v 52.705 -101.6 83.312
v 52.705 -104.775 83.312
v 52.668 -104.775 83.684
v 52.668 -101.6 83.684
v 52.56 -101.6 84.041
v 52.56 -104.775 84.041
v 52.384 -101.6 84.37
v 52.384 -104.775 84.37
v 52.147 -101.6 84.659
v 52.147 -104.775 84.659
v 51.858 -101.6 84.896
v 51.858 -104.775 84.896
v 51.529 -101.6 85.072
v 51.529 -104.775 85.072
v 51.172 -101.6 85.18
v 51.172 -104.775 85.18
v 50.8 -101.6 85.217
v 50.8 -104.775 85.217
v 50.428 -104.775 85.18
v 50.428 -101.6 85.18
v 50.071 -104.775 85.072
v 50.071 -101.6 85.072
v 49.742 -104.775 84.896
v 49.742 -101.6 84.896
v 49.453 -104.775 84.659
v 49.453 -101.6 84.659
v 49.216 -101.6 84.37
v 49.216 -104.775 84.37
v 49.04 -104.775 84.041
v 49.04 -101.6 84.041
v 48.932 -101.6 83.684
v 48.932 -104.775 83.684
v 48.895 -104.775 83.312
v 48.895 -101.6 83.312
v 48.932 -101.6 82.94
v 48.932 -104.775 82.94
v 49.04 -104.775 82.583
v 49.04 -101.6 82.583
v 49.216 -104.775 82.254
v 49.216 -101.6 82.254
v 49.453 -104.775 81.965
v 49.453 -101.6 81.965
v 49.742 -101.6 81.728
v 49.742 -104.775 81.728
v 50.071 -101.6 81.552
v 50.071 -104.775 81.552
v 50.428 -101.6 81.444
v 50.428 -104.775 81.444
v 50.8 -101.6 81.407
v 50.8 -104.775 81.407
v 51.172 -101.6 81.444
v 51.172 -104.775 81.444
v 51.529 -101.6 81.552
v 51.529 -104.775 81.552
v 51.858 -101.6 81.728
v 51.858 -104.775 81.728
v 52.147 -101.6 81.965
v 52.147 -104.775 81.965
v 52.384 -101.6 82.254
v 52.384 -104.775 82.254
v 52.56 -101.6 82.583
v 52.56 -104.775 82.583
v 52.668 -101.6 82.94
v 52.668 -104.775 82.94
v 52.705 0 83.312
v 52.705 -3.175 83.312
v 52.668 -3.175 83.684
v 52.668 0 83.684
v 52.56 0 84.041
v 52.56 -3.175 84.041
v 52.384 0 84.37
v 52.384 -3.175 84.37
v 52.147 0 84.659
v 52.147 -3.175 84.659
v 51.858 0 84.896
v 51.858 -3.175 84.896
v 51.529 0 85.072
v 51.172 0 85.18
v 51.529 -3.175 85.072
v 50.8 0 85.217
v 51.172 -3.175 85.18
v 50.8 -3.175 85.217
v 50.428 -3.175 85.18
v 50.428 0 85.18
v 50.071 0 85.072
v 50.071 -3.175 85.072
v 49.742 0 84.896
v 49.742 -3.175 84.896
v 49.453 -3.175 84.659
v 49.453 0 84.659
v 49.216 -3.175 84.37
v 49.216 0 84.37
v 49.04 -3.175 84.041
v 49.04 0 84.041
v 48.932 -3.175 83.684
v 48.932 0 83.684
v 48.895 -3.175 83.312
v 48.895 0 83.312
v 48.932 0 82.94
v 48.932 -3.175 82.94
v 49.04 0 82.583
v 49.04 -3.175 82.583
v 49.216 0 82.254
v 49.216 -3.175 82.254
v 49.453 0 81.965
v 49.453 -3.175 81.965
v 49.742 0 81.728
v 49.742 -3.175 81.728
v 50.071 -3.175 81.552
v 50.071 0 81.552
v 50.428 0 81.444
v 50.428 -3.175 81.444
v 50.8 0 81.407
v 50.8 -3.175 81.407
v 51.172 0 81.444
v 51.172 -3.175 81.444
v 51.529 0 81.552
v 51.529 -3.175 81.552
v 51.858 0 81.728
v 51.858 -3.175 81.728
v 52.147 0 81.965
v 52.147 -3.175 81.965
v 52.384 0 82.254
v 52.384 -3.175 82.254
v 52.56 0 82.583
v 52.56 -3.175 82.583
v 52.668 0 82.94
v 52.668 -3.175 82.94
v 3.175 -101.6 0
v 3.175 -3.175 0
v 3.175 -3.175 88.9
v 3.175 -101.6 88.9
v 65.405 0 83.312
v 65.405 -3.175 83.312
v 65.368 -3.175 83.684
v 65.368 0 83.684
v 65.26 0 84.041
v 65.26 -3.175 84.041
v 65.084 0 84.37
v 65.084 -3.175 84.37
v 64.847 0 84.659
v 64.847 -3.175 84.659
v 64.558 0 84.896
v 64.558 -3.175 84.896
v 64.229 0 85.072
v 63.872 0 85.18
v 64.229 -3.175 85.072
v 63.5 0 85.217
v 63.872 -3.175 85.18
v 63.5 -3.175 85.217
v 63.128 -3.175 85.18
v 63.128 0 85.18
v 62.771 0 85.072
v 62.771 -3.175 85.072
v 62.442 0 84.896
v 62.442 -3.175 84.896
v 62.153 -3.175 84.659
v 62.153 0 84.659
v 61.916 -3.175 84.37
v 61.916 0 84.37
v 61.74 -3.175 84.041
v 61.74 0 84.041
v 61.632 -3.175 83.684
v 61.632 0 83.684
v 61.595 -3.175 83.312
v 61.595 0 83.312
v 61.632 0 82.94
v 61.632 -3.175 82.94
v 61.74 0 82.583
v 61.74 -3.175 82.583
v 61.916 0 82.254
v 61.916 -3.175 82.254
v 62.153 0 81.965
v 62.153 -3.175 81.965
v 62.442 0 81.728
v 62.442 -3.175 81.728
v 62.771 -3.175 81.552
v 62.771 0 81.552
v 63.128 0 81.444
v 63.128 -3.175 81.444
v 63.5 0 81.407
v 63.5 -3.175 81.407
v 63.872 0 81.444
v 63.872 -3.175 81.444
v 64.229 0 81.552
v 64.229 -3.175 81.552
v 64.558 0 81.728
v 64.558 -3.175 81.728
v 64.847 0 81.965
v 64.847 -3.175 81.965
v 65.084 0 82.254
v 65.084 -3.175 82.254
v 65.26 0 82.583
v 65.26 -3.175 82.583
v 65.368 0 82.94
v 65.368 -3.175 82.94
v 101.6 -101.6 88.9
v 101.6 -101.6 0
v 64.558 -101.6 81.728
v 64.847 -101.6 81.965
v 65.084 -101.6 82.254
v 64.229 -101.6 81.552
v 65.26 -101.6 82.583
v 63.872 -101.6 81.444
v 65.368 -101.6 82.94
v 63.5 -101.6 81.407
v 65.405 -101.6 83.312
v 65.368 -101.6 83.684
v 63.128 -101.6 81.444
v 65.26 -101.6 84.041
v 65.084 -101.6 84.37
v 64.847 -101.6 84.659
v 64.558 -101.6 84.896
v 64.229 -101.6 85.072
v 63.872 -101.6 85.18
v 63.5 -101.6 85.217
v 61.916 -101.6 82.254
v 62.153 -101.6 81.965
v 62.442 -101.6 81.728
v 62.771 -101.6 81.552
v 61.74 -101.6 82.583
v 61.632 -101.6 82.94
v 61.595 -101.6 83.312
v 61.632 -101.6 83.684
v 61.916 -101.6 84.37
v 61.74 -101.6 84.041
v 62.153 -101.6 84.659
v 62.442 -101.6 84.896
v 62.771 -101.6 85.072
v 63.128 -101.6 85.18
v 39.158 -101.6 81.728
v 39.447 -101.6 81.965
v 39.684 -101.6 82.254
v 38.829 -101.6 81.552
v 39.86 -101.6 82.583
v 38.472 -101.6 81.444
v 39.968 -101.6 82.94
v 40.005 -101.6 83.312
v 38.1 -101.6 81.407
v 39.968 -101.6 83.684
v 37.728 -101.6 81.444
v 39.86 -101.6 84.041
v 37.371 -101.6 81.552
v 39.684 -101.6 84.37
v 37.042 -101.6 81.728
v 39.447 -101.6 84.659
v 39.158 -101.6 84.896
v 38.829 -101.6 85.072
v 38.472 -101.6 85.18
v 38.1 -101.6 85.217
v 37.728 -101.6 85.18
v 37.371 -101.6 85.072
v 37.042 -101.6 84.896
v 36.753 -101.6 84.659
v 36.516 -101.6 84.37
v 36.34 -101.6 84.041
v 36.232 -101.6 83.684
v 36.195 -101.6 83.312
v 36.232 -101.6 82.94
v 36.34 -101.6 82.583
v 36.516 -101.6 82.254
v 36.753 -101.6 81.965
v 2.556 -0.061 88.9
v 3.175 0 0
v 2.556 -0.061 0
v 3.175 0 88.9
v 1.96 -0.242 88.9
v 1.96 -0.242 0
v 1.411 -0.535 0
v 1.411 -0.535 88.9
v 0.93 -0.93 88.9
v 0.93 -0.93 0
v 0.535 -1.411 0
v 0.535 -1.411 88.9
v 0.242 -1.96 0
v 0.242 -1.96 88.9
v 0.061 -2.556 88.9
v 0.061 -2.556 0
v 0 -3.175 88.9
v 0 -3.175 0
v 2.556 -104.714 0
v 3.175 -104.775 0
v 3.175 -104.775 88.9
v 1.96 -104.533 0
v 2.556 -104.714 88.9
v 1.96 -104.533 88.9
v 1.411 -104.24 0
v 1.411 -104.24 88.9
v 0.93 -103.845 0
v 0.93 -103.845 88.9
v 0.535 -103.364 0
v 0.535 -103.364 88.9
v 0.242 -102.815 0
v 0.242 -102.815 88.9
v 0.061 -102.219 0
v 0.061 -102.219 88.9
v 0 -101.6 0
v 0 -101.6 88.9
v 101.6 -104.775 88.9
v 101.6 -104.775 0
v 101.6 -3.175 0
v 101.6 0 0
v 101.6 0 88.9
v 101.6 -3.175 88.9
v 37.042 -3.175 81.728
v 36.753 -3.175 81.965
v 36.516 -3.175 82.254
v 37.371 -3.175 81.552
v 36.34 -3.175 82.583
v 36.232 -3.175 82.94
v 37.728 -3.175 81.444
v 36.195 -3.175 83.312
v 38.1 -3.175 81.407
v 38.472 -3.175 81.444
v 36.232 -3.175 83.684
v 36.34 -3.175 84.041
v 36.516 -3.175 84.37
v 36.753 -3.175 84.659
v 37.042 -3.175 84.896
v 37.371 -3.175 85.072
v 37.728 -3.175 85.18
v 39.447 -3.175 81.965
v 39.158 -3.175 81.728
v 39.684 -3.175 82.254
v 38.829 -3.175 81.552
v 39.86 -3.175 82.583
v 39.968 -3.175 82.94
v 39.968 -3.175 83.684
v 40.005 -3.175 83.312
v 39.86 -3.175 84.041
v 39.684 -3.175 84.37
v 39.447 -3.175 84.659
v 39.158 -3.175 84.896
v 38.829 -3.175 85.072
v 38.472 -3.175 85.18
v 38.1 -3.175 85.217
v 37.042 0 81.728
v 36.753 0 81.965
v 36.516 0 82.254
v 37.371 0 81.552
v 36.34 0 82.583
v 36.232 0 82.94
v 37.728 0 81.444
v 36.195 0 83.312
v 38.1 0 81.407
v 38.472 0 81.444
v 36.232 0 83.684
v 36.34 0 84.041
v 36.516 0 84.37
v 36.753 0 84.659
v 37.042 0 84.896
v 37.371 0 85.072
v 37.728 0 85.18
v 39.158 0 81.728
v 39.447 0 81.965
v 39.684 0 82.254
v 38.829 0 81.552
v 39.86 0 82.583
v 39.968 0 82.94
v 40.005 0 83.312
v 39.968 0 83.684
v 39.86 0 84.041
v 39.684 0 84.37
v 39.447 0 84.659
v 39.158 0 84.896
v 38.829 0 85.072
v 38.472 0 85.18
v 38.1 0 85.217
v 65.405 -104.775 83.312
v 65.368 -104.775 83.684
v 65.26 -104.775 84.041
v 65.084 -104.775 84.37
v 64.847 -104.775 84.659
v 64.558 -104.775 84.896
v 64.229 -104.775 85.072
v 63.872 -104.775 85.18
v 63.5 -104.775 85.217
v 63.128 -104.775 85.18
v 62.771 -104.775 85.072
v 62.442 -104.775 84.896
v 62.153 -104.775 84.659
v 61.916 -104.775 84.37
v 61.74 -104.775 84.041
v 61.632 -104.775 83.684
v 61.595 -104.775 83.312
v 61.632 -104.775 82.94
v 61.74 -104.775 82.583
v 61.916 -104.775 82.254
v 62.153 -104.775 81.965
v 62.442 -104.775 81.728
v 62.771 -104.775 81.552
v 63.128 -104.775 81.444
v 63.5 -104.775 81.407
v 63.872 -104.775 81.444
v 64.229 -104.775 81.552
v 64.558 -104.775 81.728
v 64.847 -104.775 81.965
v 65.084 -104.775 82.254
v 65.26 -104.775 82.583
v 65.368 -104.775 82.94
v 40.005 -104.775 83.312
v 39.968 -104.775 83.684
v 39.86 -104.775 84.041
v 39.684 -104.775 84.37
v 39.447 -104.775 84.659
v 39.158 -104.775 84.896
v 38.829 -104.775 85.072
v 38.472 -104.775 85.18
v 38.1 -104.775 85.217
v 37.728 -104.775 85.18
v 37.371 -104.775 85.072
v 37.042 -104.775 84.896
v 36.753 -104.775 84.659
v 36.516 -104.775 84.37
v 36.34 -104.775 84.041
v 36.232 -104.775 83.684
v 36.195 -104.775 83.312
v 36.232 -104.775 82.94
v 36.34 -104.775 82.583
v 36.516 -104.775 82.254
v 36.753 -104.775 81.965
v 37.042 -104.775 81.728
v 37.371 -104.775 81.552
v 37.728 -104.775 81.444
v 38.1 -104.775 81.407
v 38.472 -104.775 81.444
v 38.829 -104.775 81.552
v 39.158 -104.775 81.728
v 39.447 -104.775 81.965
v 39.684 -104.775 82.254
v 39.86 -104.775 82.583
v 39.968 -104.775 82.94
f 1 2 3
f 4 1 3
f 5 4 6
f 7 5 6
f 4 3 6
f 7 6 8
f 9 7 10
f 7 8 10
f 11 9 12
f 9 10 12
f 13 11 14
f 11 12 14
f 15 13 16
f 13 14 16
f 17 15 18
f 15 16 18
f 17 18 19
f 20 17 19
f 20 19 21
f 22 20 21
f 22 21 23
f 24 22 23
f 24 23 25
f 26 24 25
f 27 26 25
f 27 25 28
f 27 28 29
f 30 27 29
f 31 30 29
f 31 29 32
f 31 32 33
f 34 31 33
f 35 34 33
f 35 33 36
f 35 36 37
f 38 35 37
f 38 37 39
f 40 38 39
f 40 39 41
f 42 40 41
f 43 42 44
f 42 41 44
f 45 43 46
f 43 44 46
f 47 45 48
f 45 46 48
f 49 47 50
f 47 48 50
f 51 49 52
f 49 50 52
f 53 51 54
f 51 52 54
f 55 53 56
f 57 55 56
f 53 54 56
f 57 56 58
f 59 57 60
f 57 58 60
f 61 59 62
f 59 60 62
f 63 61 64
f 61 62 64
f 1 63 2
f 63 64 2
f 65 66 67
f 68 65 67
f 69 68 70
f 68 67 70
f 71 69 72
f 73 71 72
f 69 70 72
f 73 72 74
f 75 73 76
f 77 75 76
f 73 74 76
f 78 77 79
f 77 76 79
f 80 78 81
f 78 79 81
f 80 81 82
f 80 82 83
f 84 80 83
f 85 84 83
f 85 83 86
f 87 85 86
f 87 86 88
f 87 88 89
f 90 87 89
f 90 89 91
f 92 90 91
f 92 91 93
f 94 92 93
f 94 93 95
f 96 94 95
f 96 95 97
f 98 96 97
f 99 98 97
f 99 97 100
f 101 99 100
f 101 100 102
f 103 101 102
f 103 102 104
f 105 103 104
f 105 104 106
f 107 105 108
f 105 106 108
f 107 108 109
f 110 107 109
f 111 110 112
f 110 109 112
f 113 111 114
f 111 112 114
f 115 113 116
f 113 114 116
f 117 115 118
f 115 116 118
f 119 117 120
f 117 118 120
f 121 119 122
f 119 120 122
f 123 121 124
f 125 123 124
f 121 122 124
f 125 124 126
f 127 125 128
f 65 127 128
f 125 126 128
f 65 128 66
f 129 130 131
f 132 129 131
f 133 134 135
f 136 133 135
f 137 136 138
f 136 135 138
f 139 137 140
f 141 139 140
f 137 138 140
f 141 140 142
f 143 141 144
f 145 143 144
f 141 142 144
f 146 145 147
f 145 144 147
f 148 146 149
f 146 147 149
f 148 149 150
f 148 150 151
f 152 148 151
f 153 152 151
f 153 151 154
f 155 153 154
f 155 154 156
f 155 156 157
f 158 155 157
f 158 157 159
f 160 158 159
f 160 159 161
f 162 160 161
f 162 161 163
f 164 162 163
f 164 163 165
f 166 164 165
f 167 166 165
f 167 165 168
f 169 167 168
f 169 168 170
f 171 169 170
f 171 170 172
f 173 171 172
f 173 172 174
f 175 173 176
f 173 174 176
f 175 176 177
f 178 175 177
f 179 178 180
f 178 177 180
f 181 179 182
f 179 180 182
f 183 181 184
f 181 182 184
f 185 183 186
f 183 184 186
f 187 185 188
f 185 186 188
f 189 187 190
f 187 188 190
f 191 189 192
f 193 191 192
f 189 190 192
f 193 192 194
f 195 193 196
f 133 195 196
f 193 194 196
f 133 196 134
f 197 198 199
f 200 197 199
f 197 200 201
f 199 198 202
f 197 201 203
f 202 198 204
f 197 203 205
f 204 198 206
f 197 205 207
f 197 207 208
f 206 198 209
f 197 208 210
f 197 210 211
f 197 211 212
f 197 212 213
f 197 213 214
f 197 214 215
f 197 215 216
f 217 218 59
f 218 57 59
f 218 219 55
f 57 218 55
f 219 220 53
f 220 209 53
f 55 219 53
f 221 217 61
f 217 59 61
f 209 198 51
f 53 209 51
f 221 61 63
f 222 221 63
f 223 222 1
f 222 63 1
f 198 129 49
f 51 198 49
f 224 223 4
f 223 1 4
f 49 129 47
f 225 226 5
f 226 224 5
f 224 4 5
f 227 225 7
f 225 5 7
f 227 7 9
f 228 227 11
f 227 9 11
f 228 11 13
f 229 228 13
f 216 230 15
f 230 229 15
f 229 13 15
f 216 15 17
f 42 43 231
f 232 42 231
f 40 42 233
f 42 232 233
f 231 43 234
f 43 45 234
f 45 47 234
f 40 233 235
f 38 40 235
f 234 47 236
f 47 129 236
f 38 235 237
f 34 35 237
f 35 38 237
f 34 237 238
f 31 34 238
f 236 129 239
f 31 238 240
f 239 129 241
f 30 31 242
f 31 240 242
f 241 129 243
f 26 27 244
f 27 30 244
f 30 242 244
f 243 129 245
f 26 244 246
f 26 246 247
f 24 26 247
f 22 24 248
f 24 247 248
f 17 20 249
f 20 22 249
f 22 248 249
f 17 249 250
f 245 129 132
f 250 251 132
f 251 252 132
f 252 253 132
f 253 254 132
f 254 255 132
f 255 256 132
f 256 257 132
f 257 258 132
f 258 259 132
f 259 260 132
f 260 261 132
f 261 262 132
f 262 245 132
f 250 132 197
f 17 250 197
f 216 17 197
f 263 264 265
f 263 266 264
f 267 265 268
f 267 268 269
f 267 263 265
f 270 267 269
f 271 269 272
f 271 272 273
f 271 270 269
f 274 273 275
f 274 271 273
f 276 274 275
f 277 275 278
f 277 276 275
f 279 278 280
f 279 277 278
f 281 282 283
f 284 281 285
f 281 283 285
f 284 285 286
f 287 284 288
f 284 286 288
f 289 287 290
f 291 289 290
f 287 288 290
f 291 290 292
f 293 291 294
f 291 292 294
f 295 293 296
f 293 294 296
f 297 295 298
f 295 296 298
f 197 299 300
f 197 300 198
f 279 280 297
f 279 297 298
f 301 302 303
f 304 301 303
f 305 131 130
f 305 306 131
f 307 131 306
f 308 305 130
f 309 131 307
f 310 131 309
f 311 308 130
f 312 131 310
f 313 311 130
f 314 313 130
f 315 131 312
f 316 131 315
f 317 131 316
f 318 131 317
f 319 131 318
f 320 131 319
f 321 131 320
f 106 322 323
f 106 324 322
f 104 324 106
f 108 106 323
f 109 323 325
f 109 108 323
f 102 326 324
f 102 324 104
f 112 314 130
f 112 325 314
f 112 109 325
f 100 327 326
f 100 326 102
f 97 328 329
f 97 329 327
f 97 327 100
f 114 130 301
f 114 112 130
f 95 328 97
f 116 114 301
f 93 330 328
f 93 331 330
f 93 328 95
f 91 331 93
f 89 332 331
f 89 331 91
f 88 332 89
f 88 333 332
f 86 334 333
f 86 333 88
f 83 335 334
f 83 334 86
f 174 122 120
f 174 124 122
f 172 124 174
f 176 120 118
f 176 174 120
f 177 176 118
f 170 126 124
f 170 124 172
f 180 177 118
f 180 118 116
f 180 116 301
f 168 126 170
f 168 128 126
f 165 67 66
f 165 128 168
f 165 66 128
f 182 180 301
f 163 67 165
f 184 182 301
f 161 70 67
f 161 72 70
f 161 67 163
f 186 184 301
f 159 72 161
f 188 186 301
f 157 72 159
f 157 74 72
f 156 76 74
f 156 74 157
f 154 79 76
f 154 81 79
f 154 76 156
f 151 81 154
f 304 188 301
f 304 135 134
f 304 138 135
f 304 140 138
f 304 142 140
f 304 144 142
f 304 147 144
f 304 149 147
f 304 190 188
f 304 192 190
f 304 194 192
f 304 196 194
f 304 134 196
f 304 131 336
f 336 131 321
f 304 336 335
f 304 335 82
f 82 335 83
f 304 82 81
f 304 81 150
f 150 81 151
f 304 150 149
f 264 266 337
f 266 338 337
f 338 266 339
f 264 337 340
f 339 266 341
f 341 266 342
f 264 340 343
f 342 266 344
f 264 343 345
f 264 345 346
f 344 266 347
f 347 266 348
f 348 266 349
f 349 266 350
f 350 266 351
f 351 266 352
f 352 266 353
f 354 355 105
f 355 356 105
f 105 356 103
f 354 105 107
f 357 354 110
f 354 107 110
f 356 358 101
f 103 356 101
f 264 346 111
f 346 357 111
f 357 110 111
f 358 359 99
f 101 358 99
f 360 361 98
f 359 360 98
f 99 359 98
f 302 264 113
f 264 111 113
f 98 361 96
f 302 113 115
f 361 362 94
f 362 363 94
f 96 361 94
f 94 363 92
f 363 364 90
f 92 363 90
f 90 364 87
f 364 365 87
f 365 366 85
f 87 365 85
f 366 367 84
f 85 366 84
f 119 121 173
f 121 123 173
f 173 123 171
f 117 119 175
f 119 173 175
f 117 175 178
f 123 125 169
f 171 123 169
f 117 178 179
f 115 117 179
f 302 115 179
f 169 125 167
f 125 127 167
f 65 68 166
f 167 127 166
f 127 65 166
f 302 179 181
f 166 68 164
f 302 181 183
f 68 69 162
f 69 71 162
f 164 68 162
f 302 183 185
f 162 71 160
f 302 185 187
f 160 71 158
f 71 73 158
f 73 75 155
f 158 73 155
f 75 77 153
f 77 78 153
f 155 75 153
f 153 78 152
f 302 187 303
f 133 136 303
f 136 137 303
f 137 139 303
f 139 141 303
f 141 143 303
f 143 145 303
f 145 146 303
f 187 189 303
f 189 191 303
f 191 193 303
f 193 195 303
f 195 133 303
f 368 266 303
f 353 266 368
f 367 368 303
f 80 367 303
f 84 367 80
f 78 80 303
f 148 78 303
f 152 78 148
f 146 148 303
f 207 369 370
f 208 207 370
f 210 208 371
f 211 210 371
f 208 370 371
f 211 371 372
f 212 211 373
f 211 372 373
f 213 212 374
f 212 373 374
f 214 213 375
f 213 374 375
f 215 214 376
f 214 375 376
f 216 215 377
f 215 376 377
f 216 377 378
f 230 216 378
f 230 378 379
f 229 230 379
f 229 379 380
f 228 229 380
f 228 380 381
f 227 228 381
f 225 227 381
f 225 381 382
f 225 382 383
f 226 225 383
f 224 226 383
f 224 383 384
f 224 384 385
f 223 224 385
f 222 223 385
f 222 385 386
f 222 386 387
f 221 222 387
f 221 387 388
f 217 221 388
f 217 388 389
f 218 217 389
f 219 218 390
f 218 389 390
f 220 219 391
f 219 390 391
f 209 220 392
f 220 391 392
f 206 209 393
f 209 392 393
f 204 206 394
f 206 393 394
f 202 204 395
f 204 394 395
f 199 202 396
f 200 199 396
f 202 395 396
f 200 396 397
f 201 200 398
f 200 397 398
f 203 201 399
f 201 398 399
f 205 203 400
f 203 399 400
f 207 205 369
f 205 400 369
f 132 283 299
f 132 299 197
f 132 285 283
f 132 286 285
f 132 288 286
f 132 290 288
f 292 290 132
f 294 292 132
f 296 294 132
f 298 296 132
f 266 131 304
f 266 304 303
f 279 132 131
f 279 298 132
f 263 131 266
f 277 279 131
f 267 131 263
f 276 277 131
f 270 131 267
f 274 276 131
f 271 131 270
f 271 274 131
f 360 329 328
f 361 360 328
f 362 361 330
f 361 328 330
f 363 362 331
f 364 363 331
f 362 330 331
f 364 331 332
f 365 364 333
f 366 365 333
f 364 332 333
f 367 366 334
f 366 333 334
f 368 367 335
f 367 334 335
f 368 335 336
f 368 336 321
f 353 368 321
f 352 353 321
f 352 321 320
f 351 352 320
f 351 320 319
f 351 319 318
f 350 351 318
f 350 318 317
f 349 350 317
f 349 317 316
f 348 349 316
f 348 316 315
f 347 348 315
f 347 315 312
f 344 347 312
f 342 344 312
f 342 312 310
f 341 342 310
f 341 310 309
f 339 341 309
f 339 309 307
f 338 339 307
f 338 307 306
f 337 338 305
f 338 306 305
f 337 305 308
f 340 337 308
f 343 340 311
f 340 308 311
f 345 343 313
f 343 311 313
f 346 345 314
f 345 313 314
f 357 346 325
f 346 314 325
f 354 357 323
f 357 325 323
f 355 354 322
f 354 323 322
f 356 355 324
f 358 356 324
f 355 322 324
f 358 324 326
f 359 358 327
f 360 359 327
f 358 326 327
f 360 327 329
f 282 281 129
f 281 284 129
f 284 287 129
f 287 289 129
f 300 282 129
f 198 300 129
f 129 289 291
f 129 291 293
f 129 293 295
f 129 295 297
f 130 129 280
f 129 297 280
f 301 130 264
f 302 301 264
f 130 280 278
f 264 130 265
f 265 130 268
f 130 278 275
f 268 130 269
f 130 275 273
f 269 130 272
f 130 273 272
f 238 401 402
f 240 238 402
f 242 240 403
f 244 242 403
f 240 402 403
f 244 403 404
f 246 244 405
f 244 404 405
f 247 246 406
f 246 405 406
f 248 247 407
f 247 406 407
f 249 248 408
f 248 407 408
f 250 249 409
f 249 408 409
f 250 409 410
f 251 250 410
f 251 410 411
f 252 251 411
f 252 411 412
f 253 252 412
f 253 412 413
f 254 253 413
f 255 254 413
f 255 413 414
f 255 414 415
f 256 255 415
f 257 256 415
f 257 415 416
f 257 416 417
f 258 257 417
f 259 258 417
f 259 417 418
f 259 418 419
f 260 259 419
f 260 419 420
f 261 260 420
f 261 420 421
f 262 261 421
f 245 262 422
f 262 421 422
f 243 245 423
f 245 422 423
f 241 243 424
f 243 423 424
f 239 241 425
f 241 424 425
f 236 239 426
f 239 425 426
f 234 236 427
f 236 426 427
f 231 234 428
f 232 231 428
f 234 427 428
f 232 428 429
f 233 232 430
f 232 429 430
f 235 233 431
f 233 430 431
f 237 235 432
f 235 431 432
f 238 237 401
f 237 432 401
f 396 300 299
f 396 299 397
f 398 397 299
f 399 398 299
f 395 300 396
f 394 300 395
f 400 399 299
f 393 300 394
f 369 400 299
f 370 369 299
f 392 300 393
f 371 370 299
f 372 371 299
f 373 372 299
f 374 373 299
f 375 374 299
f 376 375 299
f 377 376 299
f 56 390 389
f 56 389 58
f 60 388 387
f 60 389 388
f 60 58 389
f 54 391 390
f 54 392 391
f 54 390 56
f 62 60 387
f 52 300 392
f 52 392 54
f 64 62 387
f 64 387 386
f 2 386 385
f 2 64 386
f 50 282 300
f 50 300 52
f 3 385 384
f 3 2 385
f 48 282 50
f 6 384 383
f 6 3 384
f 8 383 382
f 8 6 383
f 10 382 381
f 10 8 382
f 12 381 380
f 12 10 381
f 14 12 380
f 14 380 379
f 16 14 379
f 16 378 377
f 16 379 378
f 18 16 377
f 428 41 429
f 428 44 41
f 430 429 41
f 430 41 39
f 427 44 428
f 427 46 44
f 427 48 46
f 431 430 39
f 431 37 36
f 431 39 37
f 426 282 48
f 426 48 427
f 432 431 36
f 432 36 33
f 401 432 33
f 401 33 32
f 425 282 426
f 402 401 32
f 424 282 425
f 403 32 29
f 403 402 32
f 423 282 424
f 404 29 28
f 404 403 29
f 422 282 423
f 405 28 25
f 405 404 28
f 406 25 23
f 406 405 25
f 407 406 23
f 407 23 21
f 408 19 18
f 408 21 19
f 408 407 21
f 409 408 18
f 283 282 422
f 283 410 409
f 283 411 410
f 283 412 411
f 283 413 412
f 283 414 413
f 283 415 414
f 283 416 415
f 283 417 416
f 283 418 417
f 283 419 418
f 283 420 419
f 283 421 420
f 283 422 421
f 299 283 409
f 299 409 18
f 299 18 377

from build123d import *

# Parameters (mm, degrees)
F0_W     = 101.6
F0_H     = 88.9
F1_DEPTH = 3.175
F2_W     = 3.175
F2_H     = 88.9
F3_DEPTH = 101.6
F4_W     = 3.175
F4_H     = 88.9
F5_DEPTH = 98.425
F6_R     = 3.175
F7_R     = 1.905
F8_DEPTH = 104.776


with BuildPart() as f1:
    # F0 (on Front) → F1 (new body)
    with BuildSketch(Plane.XZ):
        with Locations((50.8, 44.45)):
            Rectangle(F0_W, F0_H)
    extrude(amount=F1_DEPTH)

    # F2 (on face) → F3 (join)
    with BuildSketch(Plane.XZ.offset(3.175)):
        with Locations((1.5875, 44.45)):
            Rectangle(F2_W, F2_H)
    extrude(amount=F3_DEPTH)

    # F4 (on face) → F5 (join, through all)
    with BuildSketch(Plane.YZ.offset(3.175)):
        with Locations((-103.1875, 44.45)):
            Rectangle(F4_W, F4_H)
    extrude(amount=F5_DEPTH)

    # F6
    f6_edges = [f1.edges().sort_by_distance(p)[0] for p in [
        (0, 0, 44.45),
        (0, -104.775, 44.45),
    ]]
    fillet(f6_edges, radius=F6_R)

    # F7 (on face) → F8 (cut, through all)
    with BuildSketch(Plane.XZ.offset(104.775)):
        with Locations((38.1, 83.312)):
            Circle(F7_R)
        with Locations((50.8, 83.312)):
            Circle(F7_R)
        with Locations((63.5, 83.312)):
            Circle(F7_R)
    extrude(amount=-F8_DEPTH, mode=Mode.SUBTRACT)


solid = f1.part
